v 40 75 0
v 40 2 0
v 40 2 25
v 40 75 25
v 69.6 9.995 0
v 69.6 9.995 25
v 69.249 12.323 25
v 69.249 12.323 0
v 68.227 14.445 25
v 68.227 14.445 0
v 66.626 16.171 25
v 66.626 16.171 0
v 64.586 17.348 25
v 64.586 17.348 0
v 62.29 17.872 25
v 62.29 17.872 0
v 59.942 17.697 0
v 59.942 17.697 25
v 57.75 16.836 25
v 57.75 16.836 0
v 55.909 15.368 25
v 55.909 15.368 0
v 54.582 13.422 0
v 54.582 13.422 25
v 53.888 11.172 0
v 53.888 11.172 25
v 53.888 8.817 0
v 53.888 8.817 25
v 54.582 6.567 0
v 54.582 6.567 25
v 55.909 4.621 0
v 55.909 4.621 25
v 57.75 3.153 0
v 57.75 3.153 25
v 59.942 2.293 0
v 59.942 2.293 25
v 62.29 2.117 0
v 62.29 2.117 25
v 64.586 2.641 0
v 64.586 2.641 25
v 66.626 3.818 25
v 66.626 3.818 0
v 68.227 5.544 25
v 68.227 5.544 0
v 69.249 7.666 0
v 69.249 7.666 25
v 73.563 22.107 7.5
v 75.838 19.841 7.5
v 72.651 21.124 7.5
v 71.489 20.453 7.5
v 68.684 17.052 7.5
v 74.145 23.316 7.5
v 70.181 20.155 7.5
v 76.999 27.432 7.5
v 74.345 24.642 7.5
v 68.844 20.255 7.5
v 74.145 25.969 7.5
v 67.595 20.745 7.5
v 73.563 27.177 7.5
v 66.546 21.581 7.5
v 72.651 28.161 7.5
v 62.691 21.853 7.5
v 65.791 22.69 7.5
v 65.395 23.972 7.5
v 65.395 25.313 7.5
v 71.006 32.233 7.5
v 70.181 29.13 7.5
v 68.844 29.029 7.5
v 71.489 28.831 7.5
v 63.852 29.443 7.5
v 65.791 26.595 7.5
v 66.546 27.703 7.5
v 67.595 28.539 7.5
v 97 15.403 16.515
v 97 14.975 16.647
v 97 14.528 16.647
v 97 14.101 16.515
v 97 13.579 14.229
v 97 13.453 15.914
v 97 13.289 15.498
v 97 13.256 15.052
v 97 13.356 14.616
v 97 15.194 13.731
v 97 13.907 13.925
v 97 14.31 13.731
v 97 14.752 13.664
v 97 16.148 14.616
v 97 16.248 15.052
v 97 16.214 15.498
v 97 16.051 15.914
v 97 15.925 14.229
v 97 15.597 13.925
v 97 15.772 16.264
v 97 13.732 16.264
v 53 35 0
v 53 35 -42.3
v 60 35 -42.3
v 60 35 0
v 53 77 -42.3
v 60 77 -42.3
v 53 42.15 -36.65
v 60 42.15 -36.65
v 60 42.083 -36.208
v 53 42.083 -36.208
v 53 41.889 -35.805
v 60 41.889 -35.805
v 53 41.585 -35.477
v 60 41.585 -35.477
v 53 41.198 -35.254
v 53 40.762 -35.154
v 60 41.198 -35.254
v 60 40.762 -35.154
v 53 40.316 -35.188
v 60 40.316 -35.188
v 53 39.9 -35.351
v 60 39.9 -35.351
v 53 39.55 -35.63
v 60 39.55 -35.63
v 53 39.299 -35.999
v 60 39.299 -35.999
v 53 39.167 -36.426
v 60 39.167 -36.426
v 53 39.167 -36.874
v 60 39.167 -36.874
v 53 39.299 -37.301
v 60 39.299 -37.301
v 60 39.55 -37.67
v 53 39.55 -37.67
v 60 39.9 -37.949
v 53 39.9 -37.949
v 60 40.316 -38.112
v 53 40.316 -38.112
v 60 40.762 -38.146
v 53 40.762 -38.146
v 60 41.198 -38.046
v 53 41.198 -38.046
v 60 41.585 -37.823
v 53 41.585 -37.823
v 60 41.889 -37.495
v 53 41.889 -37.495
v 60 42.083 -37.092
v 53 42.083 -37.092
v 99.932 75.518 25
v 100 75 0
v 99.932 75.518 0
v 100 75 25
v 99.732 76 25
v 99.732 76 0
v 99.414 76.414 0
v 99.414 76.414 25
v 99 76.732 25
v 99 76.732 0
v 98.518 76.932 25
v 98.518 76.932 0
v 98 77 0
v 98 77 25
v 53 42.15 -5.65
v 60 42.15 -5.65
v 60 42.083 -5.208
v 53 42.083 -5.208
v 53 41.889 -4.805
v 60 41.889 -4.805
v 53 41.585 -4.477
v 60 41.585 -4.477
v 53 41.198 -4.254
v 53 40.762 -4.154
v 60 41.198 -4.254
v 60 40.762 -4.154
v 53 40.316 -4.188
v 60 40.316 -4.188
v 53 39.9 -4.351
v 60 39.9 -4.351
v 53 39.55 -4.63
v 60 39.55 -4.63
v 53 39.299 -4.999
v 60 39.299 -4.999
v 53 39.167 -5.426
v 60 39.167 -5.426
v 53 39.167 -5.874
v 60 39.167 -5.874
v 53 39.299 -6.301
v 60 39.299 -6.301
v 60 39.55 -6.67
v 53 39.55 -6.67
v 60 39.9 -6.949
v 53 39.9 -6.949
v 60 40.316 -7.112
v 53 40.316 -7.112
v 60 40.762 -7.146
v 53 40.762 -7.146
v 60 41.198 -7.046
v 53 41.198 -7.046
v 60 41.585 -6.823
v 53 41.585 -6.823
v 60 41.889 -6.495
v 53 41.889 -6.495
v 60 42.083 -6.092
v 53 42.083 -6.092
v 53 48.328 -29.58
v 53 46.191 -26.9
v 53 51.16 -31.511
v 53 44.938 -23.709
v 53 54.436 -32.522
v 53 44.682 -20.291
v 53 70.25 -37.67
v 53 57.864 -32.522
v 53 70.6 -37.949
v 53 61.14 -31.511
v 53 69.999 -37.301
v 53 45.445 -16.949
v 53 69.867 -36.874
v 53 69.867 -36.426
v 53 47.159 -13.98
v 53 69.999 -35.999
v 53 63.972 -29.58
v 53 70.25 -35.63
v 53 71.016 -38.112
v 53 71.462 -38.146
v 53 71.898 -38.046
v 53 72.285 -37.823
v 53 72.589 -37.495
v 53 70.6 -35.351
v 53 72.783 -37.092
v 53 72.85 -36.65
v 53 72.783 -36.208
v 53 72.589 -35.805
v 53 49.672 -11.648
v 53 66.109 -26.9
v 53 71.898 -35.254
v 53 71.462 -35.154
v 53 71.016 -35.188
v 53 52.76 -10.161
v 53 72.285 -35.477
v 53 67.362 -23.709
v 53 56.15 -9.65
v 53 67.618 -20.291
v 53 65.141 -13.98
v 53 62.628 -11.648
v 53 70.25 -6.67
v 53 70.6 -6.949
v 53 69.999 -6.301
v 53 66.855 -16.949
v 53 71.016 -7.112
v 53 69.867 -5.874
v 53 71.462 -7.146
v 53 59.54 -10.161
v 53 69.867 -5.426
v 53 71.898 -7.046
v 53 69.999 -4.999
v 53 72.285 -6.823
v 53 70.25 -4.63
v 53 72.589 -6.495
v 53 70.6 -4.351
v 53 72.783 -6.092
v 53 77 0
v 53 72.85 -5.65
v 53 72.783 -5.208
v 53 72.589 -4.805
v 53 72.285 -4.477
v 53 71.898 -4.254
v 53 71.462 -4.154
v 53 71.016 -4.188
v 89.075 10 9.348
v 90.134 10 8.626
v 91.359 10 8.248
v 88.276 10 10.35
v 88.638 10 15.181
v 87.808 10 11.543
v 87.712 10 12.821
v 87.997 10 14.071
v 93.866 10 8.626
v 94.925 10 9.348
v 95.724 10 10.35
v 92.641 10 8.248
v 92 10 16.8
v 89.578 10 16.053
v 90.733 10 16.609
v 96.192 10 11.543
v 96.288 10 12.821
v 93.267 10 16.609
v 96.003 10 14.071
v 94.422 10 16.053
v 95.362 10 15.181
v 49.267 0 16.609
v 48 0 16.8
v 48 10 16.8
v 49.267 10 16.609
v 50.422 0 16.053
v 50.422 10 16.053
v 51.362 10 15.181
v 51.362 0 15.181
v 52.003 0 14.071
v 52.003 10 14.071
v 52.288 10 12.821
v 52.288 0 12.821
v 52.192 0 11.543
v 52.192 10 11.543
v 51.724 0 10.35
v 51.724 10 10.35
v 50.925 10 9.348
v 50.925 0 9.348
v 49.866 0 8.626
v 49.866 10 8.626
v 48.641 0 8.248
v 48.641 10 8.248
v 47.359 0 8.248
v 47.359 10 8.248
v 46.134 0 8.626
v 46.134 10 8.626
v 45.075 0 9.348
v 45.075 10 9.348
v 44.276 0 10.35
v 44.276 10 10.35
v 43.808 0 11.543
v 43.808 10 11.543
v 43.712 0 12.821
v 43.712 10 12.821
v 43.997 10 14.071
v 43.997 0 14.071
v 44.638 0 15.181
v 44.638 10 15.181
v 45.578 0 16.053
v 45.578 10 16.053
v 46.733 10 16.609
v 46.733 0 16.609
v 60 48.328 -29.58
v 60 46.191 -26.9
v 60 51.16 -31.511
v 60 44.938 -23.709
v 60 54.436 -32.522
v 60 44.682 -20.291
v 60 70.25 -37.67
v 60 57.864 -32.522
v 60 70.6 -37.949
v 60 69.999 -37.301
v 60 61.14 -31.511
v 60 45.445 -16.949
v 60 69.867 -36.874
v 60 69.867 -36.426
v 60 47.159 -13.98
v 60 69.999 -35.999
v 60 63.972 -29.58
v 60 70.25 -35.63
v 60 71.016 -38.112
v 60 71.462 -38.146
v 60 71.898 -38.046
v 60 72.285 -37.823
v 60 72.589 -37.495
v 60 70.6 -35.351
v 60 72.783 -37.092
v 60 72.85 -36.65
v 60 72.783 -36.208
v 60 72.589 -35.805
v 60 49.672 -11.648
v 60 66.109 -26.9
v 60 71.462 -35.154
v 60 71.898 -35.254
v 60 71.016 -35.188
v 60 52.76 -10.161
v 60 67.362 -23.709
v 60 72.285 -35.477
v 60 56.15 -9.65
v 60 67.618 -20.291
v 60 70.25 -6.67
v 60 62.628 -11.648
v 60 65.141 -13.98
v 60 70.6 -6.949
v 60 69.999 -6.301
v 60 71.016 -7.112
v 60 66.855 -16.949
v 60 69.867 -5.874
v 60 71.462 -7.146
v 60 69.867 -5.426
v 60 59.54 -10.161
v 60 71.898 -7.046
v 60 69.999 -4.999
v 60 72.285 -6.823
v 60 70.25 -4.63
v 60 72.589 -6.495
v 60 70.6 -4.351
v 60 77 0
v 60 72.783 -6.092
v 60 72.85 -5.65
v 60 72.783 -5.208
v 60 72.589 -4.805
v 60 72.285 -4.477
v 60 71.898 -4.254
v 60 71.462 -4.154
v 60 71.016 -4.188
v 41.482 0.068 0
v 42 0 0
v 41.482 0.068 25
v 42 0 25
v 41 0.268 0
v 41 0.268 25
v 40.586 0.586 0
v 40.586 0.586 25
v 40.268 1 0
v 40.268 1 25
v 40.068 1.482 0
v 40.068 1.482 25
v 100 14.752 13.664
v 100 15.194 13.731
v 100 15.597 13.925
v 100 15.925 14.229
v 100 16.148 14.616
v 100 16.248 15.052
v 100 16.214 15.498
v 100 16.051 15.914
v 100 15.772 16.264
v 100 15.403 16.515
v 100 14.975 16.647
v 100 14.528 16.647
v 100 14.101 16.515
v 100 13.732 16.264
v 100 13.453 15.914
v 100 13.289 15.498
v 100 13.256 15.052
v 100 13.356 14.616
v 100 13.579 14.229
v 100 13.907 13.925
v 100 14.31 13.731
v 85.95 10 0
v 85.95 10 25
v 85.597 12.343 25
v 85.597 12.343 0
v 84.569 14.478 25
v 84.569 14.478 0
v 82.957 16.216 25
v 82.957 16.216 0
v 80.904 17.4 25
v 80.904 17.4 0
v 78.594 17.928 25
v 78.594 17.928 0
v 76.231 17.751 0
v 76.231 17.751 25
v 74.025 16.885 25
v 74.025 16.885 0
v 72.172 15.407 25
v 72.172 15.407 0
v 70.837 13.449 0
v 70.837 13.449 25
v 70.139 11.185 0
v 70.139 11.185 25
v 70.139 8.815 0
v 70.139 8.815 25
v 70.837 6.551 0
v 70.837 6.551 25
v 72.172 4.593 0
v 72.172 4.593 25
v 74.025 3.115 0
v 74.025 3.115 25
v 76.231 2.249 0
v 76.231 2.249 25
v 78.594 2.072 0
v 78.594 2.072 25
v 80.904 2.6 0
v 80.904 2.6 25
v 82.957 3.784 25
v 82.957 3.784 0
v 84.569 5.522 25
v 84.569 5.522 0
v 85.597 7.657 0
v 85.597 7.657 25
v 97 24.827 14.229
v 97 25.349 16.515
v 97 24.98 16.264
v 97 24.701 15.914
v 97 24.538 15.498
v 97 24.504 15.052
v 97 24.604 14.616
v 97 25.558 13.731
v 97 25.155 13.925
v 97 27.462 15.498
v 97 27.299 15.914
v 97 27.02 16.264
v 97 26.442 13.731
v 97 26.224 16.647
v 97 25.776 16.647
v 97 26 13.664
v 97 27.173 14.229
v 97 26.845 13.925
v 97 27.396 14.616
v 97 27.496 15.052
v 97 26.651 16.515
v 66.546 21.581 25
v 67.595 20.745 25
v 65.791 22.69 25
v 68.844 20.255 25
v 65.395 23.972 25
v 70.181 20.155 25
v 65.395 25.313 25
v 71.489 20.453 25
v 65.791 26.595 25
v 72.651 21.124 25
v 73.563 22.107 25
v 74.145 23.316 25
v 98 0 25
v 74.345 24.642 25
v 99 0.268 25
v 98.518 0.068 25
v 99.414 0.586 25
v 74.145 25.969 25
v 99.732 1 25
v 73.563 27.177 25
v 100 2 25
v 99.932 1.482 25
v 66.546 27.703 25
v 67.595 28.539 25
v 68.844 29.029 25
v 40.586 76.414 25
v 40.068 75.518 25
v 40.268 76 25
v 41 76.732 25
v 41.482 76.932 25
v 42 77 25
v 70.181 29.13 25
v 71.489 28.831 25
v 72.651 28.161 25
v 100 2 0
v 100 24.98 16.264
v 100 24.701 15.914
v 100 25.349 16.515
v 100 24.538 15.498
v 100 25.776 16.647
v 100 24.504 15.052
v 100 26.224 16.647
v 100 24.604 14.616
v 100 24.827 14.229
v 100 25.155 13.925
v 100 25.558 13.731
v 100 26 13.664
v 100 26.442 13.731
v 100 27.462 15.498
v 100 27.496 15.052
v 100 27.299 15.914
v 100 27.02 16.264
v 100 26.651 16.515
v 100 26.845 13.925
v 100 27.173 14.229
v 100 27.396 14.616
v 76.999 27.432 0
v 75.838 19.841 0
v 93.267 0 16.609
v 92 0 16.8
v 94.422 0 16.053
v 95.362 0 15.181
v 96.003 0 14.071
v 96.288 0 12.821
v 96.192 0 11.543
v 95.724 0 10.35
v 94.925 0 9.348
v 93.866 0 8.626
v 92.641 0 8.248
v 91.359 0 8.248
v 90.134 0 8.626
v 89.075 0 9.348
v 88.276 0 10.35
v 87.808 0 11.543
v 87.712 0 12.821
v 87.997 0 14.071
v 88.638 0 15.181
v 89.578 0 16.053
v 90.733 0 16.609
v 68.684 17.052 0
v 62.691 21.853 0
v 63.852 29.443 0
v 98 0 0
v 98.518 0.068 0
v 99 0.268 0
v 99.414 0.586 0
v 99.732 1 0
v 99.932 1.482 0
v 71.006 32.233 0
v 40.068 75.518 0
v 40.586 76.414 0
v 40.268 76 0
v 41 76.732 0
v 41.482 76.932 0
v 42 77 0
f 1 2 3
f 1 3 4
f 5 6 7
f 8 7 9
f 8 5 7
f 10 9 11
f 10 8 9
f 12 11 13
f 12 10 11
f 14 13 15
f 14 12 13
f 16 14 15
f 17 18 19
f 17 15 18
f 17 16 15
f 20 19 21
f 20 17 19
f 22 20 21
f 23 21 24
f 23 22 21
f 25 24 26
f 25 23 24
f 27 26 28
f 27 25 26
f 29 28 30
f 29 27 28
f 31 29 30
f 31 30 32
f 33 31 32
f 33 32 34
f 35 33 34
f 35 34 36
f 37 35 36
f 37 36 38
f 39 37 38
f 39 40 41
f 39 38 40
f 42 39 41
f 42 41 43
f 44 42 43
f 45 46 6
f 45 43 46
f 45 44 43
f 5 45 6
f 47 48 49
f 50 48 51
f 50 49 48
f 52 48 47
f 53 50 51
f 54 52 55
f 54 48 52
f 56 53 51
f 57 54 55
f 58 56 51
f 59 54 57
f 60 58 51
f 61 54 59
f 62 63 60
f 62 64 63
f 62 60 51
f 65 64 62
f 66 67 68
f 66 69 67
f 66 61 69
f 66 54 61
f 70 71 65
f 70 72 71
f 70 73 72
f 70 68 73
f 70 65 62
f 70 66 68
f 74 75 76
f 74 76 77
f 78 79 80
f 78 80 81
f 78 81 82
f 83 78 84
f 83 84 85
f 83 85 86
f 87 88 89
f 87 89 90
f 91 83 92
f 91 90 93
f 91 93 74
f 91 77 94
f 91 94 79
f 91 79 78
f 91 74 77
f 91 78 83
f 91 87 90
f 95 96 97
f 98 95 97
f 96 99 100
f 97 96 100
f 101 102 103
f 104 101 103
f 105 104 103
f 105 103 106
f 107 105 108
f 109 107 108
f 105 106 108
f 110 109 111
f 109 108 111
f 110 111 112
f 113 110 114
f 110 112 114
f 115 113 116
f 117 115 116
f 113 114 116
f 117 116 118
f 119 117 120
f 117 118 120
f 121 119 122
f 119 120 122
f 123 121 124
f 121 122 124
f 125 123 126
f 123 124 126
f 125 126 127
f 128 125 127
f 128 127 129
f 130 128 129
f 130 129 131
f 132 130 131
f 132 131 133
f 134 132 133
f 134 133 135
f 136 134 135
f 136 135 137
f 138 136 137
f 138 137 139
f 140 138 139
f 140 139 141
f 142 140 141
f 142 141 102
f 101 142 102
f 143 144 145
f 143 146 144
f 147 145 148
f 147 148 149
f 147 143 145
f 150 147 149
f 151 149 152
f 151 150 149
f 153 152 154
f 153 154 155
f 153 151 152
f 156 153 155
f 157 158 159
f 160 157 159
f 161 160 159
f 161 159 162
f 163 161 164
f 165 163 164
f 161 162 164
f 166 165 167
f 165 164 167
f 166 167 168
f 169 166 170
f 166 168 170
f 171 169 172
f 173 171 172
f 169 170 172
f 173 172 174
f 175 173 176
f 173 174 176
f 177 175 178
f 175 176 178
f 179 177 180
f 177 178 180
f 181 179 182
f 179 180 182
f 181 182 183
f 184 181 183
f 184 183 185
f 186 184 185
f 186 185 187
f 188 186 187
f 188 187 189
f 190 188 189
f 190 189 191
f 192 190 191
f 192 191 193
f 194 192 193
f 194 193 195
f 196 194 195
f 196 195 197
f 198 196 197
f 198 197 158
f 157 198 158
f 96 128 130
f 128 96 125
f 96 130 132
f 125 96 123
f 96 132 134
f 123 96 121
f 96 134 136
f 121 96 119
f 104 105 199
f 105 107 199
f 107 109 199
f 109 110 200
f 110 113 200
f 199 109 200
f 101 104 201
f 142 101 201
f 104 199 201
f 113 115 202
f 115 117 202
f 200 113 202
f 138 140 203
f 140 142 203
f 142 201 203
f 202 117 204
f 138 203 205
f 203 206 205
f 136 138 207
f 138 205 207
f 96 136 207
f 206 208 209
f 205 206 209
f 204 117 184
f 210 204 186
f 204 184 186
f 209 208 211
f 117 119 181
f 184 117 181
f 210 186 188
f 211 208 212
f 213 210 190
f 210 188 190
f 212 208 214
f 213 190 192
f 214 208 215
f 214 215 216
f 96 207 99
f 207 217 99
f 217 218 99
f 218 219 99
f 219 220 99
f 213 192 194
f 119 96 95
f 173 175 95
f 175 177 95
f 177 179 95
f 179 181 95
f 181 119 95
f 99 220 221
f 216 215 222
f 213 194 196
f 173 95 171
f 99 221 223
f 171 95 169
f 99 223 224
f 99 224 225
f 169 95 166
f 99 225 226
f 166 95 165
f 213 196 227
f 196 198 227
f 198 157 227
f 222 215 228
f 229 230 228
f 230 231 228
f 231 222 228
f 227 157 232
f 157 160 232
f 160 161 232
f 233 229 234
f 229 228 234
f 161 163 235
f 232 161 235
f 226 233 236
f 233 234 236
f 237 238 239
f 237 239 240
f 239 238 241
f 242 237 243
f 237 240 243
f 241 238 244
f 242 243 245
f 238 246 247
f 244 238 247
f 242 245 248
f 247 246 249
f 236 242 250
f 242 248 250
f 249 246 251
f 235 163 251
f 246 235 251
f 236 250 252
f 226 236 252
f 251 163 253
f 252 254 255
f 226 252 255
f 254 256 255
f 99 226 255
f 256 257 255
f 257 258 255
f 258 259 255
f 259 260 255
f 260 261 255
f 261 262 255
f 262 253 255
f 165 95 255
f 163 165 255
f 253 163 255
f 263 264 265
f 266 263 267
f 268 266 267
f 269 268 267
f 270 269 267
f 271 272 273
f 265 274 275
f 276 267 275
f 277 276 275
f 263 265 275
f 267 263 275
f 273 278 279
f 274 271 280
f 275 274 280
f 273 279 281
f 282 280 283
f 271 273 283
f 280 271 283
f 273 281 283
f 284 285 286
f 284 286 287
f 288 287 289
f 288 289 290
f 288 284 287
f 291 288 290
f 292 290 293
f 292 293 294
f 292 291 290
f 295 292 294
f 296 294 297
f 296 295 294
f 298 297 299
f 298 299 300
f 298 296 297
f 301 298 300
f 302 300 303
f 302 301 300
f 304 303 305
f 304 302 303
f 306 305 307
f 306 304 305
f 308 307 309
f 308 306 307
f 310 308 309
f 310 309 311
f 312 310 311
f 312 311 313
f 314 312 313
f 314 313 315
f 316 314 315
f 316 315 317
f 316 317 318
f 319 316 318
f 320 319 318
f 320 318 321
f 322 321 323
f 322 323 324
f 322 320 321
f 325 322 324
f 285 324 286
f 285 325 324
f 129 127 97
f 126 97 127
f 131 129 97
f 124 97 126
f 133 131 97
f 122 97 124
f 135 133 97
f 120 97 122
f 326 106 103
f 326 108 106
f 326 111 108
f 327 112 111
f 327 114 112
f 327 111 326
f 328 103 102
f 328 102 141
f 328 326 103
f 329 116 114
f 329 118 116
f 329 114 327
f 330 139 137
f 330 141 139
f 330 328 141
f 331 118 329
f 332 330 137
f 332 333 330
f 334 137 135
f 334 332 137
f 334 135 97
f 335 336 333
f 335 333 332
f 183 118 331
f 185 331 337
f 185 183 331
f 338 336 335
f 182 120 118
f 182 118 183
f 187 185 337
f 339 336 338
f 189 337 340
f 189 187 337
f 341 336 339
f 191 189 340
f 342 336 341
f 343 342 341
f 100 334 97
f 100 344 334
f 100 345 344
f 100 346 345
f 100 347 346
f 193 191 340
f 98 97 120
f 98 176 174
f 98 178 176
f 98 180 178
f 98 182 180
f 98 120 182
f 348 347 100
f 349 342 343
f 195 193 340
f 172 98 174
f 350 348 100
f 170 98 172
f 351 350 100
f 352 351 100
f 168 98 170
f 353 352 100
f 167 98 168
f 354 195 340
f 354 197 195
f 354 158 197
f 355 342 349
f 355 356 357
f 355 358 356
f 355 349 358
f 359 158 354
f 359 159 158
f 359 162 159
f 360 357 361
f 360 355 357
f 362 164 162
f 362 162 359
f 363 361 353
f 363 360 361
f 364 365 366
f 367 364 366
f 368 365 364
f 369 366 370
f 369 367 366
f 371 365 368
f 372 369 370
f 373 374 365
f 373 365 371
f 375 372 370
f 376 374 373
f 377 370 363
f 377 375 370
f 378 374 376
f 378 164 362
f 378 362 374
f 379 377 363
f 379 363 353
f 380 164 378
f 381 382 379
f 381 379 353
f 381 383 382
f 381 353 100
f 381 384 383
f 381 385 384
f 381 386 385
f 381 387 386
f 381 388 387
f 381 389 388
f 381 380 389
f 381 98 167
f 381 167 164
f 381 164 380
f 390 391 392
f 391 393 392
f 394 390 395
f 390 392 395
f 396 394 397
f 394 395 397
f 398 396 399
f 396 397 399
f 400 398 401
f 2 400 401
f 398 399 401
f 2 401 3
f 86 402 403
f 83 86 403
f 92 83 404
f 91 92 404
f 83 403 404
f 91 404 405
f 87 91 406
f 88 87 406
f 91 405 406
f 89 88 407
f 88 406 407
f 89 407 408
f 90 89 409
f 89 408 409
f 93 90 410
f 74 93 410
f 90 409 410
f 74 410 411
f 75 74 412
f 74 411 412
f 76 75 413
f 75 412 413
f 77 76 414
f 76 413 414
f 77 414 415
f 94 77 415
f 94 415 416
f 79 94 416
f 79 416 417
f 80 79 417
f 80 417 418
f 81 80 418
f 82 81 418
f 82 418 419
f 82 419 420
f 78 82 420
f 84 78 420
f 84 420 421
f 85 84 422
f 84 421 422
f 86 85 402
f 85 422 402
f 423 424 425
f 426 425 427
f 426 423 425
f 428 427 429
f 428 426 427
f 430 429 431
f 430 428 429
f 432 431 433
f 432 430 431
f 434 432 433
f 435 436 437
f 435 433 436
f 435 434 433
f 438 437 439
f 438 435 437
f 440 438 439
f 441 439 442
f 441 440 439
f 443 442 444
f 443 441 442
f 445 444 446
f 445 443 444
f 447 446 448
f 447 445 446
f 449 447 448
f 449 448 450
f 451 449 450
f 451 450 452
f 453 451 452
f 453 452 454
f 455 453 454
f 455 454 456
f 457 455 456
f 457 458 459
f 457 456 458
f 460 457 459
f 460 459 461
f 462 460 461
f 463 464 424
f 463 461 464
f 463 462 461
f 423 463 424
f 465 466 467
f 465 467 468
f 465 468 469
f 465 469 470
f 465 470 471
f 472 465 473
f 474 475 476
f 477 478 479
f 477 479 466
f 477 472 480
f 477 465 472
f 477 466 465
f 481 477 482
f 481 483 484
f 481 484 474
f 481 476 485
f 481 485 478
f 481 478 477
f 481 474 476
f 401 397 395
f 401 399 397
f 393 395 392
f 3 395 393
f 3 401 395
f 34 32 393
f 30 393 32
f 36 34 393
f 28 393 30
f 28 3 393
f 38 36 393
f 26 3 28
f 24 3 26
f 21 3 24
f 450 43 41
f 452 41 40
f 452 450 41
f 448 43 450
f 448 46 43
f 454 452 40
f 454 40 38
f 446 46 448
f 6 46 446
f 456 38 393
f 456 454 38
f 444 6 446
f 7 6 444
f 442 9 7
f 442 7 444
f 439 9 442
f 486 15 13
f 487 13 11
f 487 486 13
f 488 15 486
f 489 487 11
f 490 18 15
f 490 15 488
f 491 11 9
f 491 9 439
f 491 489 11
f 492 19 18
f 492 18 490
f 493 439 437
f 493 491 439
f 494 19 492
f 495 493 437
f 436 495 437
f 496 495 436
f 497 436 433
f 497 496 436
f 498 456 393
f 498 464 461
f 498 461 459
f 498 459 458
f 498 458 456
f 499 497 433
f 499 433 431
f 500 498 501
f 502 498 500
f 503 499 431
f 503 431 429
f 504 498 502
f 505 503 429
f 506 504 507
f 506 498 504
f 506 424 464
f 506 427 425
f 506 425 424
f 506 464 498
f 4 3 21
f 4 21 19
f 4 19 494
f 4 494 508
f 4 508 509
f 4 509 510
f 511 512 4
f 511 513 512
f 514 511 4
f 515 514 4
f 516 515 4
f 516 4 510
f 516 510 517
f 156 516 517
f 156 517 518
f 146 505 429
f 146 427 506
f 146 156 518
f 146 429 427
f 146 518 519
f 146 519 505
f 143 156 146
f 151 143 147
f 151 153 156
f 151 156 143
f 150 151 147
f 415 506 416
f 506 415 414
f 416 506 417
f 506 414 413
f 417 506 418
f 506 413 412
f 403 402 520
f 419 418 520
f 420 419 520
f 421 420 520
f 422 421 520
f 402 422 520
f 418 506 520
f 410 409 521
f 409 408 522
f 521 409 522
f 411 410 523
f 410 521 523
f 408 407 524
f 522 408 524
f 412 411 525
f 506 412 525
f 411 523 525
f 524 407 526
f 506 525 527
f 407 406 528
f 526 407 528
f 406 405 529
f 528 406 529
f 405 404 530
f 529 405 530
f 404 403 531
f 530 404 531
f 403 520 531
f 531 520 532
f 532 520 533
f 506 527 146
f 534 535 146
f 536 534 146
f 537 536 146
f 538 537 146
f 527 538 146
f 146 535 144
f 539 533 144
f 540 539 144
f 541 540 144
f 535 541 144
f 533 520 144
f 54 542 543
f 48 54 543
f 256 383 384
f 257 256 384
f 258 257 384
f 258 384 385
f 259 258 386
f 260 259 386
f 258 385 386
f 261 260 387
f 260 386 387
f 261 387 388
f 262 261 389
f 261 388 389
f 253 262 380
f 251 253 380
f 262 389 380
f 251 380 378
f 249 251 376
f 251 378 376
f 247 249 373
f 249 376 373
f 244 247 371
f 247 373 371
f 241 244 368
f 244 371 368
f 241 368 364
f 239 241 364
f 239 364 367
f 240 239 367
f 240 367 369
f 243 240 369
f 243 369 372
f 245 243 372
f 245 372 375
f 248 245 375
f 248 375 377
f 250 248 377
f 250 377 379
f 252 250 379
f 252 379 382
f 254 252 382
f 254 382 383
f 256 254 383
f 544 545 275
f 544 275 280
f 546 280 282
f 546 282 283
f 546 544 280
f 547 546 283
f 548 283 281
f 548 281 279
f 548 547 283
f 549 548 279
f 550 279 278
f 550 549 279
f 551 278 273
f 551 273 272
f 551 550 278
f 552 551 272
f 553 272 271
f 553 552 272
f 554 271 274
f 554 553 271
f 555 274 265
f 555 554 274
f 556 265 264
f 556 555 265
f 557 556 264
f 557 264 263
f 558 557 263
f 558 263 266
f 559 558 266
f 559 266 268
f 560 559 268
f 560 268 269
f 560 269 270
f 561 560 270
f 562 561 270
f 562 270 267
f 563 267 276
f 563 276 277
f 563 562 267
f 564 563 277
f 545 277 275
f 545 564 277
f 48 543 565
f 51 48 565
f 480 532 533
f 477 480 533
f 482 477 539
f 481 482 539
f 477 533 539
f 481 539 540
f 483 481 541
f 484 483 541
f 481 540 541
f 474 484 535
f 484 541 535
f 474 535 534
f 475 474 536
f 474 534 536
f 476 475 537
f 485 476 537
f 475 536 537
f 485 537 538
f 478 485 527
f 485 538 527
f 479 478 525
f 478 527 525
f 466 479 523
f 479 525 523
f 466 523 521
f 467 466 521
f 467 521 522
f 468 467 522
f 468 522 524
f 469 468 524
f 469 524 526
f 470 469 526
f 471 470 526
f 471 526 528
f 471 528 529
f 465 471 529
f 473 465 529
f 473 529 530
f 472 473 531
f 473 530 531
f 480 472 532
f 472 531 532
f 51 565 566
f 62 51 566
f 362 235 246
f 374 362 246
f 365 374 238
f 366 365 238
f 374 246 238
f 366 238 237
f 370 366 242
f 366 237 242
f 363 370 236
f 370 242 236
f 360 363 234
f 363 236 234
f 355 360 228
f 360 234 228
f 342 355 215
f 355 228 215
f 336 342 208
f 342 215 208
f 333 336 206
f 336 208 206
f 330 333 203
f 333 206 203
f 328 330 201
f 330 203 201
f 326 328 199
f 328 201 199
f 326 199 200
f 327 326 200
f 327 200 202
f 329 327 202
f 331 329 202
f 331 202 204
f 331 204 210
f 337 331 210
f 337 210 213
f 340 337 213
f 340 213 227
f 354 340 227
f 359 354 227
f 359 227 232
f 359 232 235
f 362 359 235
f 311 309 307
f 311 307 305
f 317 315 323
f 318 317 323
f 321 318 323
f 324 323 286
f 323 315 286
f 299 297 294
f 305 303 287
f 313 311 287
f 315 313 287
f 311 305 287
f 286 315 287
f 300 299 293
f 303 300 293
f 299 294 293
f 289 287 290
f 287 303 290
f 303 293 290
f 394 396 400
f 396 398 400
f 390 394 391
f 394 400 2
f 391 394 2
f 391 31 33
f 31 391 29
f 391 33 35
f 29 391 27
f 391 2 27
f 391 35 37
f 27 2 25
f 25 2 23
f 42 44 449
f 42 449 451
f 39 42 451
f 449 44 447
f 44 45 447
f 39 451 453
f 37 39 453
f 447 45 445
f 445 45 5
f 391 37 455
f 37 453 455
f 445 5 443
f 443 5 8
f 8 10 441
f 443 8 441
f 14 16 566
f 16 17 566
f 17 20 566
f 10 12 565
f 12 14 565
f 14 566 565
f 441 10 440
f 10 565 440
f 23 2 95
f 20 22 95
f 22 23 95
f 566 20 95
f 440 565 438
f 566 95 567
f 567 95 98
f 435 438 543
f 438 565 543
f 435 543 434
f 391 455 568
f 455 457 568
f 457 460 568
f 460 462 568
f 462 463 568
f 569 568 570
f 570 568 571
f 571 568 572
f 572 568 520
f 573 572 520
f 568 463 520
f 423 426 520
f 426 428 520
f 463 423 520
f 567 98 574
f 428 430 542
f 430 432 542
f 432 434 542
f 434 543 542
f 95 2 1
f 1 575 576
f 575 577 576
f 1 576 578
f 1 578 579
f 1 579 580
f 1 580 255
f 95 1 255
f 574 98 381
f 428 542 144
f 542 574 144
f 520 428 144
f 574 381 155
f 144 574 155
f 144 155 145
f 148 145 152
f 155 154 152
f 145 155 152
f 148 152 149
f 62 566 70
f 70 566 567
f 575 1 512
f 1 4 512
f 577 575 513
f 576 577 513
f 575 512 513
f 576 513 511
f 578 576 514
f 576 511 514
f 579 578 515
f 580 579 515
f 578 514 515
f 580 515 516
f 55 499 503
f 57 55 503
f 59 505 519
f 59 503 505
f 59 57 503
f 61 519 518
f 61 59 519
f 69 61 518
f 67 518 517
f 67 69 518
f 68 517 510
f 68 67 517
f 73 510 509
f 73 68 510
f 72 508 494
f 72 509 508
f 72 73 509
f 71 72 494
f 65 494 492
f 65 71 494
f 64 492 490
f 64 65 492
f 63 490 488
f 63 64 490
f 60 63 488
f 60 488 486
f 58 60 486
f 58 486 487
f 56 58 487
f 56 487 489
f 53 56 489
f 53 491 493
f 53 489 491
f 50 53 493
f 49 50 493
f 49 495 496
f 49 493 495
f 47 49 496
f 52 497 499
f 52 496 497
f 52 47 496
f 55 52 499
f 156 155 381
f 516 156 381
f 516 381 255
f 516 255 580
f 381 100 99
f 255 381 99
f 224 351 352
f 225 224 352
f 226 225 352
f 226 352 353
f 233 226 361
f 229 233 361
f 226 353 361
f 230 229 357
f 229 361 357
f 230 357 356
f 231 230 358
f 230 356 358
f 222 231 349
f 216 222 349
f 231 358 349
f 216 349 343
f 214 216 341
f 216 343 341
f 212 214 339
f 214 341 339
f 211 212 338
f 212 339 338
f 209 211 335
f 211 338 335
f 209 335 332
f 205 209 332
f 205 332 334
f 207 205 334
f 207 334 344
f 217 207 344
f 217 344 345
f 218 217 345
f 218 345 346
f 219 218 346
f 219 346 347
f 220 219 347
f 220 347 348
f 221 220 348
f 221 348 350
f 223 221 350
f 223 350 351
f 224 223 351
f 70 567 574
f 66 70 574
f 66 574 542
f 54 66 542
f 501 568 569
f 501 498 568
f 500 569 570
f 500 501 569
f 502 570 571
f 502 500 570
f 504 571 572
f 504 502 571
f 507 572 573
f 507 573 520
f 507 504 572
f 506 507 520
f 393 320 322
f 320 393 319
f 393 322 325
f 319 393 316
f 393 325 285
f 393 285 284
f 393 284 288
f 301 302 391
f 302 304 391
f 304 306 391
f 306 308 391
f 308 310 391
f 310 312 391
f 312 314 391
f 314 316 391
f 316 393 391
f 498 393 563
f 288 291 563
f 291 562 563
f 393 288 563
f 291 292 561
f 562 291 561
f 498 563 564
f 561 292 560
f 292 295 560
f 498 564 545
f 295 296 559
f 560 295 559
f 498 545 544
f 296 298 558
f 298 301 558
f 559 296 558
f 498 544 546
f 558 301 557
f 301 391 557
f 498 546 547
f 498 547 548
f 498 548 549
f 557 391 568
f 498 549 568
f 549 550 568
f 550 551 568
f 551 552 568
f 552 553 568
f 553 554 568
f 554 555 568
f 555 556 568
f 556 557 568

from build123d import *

# Parameters (mm, degrees)
ESQUISSE1_W              = 100
ESQUISSE1_H              = 100
BOSS_EXTRU_1_DEPTH       = 25
ESQUISSE2_R              = 7.9
ESQUISSE2_R_2            = 7.95
ESQUISSE2_R_3            = 4.5
ENL_V_MAT_EXTRU_1_DEPTH  = 144.614066163
ESQUISSE3_R              = 4.3
ENL_V_MAT_EXTRU_3_DEPTH  = 10
ESQUISSE4_W              = 7
ESQUISSE4_H              = 42
BOSS_EXTRU_2_DEPTH       = 42.3
ESQUISSE5_R              = 1.5
ENL_V_MAT_EXTRU_4_DEPTH  = 12
ESQUISSE6_W              = 40
ESQUISSE6_H              = 100
ENL_V_MAT_EXTRU_6_DEPTH  = 148.61195751
ENL_V_MAT_EXTRU_8_DEPTH  = 7.5
ESQUISSE10_R             = 11.5
ENL_V_MAT_EXTRU_10_DEPTH = 119.314369372
ESQUISSE11_R             = 1.5
ENL_V_MAT_EXTRU_11_DEPTH = 3
ESQUISSE12_W             = 60
ESQUISSE12_H             = 23
ENL_V_MAT_EXTRU_12_DEPTH = 148.61195751
CONG_1_R                 = 2


with BuildPart() as part:
    # Esquisse1 → Boss.-Extru.1 (new body)
    with BuildSketch(Plane.XY):
        with Locations((50, 50)):
            Rectangle(ESQUISSE1_W, ESQUISSE1_H)
    extrude(amount=BOSS_EXTRU_1_DEPTH)

    # Esquisse2 → Enlèv. mat.-Extru.1 (cut, through all)
    with BuildSketch(Plane.XY):
        with Locations((61.7000009, 9.994583957)):
            Circle(ESQUISSE2_R)
        with Locations((78, 10)):
            Circle(ESQUISSE2_R_2)
        with Locations((69.845134328, 24.642259589)):
            Circle(ESQUISSE2_R_3)
    extrude(amount=ENL_V_MAT_EXTRU_1_DEPTH, mode=Mode.SUBTRACT)

    # Esquisse3 → Enlèv. mat.-Extru.3 (cut)
    with BuildSketch(Plane(origin=(0, 0, 0), x_dir=(1, 0, 0), z_dir=(0, 1, 0))):
        with Locations(Location((48, -12.5, 0), (0, 0, 270))):
            Circle(ESQUISSE3_R)
        with Locations(Location((92, -12.5, 0), (0, 0, 270))):
            Circle(ESQUISSE3_R)
    extrude(amount=ENL_V_MAT_EXTRU_3_DEPTH, mode=Mode.SUBTRACT)

    # Esquisse4 → Boss.-Extru.2 (add)
    with BuildSketch(Plane.XY):
        with Locations((56.5, 56)):
            Rectangle(ESQUISSE4_W, ESQUISSE4_H)
    extrude(amount=-BOSS_EXTRU_2_DEPTH)

    # Esquisse5 → Enlèv. mat.-Extru.4 (cut)
    with BuildSketch(Plane(origin=(60, 0, 0), x_dir=(0, 0, -1), z_dir=(1, 0, 0))):
        with Locations(Location((36.65, 71.35, 0), (0, 0, 90))):
            Circle(ESQUISSE5_R)
        with Locations(Location((36.65, 40.65, 0), (0, 0, 90))):
            Circle(ESQUISSE5_R)
        with Locations(Location((5.65, 40.65, 0), (0, 0, 90))):
            Circle(ESQUISSE5_R)
        with Locations(Location((5.65, 71.35, 0), (0, 0, 90))):
            Circle(ESQUISSE5_R)
    extrude(amount=-ENL_V_MAT_EXTRU_4_DEPTH, mode=Mode.SUBTRACT)

    # Esquisse6 → Enlèv. mat.-Extru.6 (cut, through all)
    with BuildSketch(Plane.XY):
        with Locations((20, 50)):
            Rectangle(ESQUISSE6_W, ESQUISSE6_H)
    extrude(amount=ENL_V_MAT_EXTRU_6_DEPTH, mode=Mode.SUBTRACT)

    # Esquisse8 → Enlèv. mat.-Extru.8 (cut)
    with BuildSketch(Plane(origin=(0, 0, 0), x_dir=(-1, 0, 0), z_dir=(0, 0, -1))):
        Polygon((-62.690994399, 21.852704928), (-63.852239162, 29.44314918), (-71.006379091, 32.232703841), (-76.999274258, 27.43181425), (-75.838029495, 19.841369999), (-68.683889565, 17.051815338), align=None)
    extrude(amount=-ENL_V_MAT_EXTRU_8_DEPTH, mode=Mode.SUBTRACT)

    # Esquisse10 → Enlèv. mat.-Extru.10 (cut, through all)
    with BuildSketch(Plane.ZY.offset(-53)):
        with Locations((-21.15, 56.15)):
            Circle(ESQUISSE10_R)
    extrude(amount=-ENL_V_MAT_EXTRU_10_DEPTH, mode=Mode.SUBTRACT)

    # Esquisse11 → Enlèv. mat.-Extru.11 (cut)
    with BuildSketch(Plane(origin=(100, 0, 0), x_dir=(0, 0, -1), z_dir=(1, 0, 0))):
        with Locations((-15.163954836, 26)):
            Circle(ESQUISSE11_R)
        with Locations((-15.163954836, 14.75187619)):
            Circle(ESQUISSE11_R)
    extrude(amount=-ENL_V_MAT_EXTRU_11_DEPTH, mode=Mode.SUBTRACT)

    # Esquisse12 → Enlèv. mat.-Extru.12 (cut, through all)
    with BuildSketch(Plane(origin=(0, 0, 0), x_dir=(-1, 0, 0), z_dir=(0, 0, -1))):
        with Locations((-70, 88.5)):
            Rectangle(ESQUISSE12_W, ESQUISSE12_H)
    extrude(amount=-ENL_V_MAT_EXTRU_12_DEPTH, mode=Mode.SUBTRACT)

    # Congé1
    cong_1_edges = [part.edges().sort_by_distance(p)[0] for p in [
        (100, 77, 12.5),
        (40, 77, 12.5),
        (40, 0, 12.5),
        (100, 0, 12.5),
    ]]
    fillet(cong_1_edges, radius=CONG_1_R)


solid = part.part
